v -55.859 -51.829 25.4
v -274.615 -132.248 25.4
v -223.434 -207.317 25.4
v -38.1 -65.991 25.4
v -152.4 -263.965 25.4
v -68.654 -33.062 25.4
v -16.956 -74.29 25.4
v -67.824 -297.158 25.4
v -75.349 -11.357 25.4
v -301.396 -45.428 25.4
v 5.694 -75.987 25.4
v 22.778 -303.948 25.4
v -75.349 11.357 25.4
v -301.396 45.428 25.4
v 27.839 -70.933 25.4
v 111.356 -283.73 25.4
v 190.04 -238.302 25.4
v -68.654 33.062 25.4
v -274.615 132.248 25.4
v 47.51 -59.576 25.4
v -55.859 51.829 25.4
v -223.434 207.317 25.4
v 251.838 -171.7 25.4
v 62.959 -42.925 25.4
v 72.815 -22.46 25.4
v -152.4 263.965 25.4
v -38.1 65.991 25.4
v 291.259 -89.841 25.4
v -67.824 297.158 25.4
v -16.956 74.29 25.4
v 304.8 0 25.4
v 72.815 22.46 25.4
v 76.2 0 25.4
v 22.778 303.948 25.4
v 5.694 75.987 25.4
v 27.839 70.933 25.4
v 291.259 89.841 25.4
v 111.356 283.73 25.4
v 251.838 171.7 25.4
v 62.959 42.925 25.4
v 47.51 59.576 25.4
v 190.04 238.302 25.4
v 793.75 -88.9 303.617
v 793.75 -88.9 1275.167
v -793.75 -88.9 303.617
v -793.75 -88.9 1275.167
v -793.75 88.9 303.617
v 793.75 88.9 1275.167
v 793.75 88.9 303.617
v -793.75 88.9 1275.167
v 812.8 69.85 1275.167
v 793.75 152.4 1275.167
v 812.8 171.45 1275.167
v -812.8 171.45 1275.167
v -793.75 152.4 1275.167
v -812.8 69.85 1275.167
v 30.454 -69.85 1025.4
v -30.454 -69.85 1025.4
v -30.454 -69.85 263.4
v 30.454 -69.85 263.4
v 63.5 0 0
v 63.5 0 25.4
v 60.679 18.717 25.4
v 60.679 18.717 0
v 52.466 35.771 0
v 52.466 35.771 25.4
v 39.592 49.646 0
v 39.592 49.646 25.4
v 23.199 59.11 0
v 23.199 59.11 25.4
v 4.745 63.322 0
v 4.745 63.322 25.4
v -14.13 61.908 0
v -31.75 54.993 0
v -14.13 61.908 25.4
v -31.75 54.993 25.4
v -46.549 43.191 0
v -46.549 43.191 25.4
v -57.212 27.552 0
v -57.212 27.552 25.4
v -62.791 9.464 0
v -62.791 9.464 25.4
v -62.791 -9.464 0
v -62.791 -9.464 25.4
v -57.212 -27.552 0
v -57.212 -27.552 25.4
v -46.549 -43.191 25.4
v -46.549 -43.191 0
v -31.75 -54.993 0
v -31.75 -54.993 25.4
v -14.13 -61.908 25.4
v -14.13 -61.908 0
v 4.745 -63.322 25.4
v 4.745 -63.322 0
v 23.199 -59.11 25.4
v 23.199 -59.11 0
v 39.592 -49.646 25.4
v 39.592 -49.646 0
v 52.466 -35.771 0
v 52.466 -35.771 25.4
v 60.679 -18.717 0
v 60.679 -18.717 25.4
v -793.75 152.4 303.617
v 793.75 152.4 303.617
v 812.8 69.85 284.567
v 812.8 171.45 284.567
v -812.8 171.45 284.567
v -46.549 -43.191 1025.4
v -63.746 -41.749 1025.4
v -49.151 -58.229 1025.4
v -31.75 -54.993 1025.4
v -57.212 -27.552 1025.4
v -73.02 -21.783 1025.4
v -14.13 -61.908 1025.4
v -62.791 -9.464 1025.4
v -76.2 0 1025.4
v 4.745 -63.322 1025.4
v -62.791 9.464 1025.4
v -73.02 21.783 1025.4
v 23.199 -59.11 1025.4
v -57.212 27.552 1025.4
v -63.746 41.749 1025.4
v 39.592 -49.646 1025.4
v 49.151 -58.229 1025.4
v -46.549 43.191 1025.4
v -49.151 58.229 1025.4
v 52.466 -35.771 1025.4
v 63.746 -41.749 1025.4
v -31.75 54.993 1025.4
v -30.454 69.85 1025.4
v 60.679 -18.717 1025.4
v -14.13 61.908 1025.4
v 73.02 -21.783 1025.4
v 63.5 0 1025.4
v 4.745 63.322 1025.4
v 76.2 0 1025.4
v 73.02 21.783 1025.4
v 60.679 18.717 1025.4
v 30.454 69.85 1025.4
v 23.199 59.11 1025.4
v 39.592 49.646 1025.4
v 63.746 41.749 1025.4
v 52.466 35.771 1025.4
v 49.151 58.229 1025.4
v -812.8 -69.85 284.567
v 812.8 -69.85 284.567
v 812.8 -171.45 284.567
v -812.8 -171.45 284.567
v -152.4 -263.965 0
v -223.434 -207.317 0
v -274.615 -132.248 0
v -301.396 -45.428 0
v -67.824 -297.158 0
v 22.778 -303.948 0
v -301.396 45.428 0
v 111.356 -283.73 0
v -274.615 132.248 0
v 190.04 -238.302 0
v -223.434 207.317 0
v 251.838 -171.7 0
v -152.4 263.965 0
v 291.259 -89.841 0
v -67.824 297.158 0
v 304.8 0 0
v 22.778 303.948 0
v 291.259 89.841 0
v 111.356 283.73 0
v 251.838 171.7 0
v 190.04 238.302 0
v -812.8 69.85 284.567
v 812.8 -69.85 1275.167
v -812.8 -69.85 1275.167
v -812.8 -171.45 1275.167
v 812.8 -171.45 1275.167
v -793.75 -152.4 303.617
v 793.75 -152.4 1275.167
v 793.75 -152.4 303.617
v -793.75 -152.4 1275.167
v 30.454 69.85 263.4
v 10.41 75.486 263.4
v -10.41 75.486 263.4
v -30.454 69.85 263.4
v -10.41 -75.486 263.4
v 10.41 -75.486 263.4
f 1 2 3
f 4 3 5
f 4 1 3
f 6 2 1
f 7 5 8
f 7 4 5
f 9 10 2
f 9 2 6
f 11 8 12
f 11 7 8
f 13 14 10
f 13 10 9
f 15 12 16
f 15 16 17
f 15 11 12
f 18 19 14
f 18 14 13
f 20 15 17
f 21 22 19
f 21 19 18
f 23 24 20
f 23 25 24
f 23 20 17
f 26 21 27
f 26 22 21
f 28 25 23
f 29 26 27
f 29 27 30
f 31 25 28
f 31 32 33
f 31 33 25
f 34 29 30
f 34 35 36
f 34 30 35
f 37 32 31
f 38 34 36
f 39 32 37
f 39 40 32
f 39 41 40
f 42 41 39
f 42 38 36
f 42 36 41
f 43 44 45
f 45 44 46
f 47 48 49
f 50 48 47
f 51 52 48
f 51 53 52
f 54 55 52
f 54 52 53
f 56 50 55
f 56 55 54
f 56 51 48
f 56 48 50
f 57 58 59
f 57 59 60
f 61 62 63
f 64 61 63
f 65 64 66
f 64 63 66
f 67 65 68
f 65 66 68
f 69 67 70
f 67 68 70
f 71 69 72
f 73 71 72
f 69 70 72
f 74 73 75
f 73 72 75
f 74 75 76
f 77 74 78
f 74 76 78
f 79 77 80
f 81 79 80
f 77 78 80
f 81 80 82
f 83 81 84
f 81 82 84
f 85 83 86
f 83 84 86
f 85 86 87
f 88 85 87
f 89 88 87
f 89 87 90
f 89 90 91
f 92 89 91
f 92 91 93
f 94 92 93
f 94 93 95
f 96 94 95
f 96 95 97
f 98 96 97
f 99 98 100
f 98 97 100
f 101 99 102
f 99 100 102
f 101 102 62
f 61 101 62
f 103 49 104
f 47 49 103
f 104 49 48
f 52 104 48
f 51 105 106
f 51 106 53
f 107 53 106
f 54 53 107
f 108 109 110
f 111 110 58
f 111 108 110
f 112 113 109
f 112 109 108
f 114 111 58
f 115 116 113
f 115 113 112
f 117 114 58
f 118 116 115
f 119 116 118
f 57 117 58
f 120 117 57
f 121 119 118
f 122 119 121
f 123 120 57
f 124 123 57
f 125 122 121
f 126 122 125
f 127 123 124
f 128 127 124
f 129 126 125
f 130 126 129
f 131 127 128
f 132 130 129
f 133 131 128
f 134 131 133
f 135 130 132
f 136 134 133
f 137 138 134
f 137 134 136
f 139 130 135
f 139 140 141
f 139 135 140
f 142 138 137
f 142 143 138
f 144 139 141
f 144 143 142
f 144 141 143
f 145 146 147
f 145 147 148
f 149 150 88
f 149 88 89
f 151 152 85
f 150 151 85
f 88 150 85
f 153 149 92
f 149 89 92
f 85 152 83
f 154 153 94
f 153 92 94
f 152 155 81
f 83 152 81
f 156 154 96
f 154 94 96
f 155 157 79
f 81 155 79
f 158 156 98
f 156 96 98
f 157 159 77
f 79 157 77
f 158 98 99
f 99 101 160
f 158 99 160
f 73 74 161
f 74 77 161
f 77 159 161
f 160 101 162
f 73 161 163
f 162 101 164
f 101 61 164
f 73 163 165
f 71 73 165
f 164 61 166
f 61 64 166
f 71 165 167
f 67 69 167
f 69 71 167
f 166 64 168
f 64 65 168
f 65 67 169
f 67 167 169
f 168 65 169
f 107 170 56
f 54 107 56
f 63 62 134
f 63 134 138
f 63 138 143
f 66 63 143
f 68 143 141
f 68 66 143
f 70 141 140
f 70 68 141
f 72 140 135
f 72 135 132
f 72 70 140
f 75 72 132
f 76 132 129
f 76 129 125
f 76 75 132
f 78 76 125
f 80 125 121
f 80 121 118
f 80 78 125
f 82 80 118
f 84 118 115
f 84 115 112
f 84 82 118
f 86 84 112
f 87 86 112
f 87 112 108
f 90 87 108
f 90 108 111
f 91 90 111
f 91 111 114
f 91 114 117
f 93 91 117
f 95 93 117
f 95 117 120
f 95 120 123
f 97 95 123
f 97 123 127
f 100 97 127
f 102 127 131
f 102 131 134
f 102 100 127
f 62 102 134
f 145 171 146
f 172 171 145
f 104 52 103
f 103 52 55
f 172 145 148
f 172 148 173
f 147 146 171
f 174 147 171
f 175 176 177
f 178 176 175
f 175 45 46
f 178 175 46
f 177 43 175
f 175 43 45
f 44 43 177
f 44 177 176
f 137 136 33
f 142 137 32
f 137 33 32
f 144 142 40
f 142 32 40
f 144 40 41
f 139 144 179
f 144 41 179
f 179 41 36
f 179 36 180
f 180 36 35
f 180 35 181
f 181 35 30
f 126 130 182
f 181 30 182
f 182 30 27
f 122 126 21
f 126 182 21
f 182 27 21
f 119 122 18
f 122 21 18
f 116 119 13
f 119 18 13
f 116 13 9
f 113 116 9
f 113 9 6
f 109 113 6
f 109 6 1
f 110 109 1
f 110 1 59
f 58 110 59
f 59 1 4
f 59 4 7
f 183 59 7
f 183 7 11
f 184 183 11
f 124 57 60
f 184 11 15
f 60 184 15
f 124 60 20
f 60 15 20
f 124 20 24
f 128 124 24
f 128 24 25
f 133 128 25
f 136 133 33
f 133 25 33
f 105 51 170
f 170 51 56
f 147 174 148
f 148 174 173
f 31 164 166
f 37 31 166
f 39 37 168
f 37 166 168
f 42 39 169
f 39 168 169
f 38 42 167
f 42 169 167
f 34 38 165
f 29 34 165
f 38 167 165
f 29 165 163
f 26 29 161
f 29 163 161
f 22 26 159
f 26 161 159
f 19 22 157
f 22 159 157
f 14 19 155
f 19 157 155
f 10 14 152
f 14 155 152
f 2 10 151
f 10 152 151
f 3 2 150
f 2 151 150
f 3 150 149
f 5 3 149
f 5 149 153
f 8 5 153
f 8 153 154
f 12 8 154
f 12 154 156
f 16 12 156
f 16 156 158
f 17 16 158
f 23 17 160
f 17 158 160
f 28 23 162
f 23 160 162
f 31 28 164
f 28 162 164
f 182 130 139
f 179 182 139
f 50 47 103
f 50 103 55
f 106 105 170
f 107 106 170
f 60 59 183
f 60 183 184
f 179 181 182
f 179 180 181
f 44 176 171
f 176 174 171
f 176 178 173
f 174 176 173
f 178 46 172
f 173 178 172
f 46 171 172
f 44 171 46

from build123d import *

# Parameters (mm, degrees)
F0_R      = 304.8
F1_DEPTH  = 25.4
F2_R      = 76.2
F2_R_2    = 63.5
F3_DEPTH  = 1000
F3_FACE_R = 63.5
F4_DEPTH  = 25.4
F5_W      = 152.12731
F5_H      = 29.139879
F5_W_2    = 161.554912
F5_H_2    = 35.139259
F6_DEPTH  = 762
F7_W      = 1625.6
F7_H      = 990.6
F8_DEPTH  = 101.6
F9_T      = -19.05


with BuildPart() as f1:
    # F0 (on Top) → F1 (new body)
    with BuildSketch(Plane.XY):
        Circle(F0_R)
    extrude(amount=F1_DEPTH)

    # F2 (on face) → F3 (join)
    with BuildSketch(Plane.XY.offset(25.4)):
        Circle(F2_R)
        Circle(F2_R_2, mode=Mode.SUBTRACT)
    extrude(amount=F3_DEPTH)

    # F3_face (on face) → F4 (cut)
    with BuildSketch(Plane.XY.offset(25.4)):
        Circle(F3_FACE_R)
    extrude(amount=-F4_DEPTH, mode=Mode.SUBTRACT)

    # F5 (on face) → F6 (cut)
    with BuildSketch(Plane.XY.offset(1025.4)):
        with Locations((0, -84.419939)):
            Rectangle(F5_W, F5_H)
        with Locations((0, 87.419629)):
            Rectangle(F5_W_2, F5_H_2)
    extrude(amount=-F6_DEPTH, mode=Mode.SUBTRACT)


with BuildPart() as f8:
    # F7 (on face) → F8 (new body)
    with BuildSketch(Plane(origin=(0, 69.85, 0), x_dir=(-1, 0, 0), z_dir=(0, 1, 0))):
        with Locations((0, 779.866667)):
            Rectangle(F7_W, F7_H)
    extrude(amount=F8_DEPTH)

    # F9
    f9_openings = [f8.faces().sort_by_distance(p)[0] for p in [
        (0, 120.65, 1275.166667),
    ]]
    offset(amount=F9_T, openings=f9_openings)


with BuildPart() as f10_1:
    # F10: instance of F8
    add(f8.part.mirror(Plane.XZ))


solid = Compound([f1.part, f8.part, f10_1.part])
